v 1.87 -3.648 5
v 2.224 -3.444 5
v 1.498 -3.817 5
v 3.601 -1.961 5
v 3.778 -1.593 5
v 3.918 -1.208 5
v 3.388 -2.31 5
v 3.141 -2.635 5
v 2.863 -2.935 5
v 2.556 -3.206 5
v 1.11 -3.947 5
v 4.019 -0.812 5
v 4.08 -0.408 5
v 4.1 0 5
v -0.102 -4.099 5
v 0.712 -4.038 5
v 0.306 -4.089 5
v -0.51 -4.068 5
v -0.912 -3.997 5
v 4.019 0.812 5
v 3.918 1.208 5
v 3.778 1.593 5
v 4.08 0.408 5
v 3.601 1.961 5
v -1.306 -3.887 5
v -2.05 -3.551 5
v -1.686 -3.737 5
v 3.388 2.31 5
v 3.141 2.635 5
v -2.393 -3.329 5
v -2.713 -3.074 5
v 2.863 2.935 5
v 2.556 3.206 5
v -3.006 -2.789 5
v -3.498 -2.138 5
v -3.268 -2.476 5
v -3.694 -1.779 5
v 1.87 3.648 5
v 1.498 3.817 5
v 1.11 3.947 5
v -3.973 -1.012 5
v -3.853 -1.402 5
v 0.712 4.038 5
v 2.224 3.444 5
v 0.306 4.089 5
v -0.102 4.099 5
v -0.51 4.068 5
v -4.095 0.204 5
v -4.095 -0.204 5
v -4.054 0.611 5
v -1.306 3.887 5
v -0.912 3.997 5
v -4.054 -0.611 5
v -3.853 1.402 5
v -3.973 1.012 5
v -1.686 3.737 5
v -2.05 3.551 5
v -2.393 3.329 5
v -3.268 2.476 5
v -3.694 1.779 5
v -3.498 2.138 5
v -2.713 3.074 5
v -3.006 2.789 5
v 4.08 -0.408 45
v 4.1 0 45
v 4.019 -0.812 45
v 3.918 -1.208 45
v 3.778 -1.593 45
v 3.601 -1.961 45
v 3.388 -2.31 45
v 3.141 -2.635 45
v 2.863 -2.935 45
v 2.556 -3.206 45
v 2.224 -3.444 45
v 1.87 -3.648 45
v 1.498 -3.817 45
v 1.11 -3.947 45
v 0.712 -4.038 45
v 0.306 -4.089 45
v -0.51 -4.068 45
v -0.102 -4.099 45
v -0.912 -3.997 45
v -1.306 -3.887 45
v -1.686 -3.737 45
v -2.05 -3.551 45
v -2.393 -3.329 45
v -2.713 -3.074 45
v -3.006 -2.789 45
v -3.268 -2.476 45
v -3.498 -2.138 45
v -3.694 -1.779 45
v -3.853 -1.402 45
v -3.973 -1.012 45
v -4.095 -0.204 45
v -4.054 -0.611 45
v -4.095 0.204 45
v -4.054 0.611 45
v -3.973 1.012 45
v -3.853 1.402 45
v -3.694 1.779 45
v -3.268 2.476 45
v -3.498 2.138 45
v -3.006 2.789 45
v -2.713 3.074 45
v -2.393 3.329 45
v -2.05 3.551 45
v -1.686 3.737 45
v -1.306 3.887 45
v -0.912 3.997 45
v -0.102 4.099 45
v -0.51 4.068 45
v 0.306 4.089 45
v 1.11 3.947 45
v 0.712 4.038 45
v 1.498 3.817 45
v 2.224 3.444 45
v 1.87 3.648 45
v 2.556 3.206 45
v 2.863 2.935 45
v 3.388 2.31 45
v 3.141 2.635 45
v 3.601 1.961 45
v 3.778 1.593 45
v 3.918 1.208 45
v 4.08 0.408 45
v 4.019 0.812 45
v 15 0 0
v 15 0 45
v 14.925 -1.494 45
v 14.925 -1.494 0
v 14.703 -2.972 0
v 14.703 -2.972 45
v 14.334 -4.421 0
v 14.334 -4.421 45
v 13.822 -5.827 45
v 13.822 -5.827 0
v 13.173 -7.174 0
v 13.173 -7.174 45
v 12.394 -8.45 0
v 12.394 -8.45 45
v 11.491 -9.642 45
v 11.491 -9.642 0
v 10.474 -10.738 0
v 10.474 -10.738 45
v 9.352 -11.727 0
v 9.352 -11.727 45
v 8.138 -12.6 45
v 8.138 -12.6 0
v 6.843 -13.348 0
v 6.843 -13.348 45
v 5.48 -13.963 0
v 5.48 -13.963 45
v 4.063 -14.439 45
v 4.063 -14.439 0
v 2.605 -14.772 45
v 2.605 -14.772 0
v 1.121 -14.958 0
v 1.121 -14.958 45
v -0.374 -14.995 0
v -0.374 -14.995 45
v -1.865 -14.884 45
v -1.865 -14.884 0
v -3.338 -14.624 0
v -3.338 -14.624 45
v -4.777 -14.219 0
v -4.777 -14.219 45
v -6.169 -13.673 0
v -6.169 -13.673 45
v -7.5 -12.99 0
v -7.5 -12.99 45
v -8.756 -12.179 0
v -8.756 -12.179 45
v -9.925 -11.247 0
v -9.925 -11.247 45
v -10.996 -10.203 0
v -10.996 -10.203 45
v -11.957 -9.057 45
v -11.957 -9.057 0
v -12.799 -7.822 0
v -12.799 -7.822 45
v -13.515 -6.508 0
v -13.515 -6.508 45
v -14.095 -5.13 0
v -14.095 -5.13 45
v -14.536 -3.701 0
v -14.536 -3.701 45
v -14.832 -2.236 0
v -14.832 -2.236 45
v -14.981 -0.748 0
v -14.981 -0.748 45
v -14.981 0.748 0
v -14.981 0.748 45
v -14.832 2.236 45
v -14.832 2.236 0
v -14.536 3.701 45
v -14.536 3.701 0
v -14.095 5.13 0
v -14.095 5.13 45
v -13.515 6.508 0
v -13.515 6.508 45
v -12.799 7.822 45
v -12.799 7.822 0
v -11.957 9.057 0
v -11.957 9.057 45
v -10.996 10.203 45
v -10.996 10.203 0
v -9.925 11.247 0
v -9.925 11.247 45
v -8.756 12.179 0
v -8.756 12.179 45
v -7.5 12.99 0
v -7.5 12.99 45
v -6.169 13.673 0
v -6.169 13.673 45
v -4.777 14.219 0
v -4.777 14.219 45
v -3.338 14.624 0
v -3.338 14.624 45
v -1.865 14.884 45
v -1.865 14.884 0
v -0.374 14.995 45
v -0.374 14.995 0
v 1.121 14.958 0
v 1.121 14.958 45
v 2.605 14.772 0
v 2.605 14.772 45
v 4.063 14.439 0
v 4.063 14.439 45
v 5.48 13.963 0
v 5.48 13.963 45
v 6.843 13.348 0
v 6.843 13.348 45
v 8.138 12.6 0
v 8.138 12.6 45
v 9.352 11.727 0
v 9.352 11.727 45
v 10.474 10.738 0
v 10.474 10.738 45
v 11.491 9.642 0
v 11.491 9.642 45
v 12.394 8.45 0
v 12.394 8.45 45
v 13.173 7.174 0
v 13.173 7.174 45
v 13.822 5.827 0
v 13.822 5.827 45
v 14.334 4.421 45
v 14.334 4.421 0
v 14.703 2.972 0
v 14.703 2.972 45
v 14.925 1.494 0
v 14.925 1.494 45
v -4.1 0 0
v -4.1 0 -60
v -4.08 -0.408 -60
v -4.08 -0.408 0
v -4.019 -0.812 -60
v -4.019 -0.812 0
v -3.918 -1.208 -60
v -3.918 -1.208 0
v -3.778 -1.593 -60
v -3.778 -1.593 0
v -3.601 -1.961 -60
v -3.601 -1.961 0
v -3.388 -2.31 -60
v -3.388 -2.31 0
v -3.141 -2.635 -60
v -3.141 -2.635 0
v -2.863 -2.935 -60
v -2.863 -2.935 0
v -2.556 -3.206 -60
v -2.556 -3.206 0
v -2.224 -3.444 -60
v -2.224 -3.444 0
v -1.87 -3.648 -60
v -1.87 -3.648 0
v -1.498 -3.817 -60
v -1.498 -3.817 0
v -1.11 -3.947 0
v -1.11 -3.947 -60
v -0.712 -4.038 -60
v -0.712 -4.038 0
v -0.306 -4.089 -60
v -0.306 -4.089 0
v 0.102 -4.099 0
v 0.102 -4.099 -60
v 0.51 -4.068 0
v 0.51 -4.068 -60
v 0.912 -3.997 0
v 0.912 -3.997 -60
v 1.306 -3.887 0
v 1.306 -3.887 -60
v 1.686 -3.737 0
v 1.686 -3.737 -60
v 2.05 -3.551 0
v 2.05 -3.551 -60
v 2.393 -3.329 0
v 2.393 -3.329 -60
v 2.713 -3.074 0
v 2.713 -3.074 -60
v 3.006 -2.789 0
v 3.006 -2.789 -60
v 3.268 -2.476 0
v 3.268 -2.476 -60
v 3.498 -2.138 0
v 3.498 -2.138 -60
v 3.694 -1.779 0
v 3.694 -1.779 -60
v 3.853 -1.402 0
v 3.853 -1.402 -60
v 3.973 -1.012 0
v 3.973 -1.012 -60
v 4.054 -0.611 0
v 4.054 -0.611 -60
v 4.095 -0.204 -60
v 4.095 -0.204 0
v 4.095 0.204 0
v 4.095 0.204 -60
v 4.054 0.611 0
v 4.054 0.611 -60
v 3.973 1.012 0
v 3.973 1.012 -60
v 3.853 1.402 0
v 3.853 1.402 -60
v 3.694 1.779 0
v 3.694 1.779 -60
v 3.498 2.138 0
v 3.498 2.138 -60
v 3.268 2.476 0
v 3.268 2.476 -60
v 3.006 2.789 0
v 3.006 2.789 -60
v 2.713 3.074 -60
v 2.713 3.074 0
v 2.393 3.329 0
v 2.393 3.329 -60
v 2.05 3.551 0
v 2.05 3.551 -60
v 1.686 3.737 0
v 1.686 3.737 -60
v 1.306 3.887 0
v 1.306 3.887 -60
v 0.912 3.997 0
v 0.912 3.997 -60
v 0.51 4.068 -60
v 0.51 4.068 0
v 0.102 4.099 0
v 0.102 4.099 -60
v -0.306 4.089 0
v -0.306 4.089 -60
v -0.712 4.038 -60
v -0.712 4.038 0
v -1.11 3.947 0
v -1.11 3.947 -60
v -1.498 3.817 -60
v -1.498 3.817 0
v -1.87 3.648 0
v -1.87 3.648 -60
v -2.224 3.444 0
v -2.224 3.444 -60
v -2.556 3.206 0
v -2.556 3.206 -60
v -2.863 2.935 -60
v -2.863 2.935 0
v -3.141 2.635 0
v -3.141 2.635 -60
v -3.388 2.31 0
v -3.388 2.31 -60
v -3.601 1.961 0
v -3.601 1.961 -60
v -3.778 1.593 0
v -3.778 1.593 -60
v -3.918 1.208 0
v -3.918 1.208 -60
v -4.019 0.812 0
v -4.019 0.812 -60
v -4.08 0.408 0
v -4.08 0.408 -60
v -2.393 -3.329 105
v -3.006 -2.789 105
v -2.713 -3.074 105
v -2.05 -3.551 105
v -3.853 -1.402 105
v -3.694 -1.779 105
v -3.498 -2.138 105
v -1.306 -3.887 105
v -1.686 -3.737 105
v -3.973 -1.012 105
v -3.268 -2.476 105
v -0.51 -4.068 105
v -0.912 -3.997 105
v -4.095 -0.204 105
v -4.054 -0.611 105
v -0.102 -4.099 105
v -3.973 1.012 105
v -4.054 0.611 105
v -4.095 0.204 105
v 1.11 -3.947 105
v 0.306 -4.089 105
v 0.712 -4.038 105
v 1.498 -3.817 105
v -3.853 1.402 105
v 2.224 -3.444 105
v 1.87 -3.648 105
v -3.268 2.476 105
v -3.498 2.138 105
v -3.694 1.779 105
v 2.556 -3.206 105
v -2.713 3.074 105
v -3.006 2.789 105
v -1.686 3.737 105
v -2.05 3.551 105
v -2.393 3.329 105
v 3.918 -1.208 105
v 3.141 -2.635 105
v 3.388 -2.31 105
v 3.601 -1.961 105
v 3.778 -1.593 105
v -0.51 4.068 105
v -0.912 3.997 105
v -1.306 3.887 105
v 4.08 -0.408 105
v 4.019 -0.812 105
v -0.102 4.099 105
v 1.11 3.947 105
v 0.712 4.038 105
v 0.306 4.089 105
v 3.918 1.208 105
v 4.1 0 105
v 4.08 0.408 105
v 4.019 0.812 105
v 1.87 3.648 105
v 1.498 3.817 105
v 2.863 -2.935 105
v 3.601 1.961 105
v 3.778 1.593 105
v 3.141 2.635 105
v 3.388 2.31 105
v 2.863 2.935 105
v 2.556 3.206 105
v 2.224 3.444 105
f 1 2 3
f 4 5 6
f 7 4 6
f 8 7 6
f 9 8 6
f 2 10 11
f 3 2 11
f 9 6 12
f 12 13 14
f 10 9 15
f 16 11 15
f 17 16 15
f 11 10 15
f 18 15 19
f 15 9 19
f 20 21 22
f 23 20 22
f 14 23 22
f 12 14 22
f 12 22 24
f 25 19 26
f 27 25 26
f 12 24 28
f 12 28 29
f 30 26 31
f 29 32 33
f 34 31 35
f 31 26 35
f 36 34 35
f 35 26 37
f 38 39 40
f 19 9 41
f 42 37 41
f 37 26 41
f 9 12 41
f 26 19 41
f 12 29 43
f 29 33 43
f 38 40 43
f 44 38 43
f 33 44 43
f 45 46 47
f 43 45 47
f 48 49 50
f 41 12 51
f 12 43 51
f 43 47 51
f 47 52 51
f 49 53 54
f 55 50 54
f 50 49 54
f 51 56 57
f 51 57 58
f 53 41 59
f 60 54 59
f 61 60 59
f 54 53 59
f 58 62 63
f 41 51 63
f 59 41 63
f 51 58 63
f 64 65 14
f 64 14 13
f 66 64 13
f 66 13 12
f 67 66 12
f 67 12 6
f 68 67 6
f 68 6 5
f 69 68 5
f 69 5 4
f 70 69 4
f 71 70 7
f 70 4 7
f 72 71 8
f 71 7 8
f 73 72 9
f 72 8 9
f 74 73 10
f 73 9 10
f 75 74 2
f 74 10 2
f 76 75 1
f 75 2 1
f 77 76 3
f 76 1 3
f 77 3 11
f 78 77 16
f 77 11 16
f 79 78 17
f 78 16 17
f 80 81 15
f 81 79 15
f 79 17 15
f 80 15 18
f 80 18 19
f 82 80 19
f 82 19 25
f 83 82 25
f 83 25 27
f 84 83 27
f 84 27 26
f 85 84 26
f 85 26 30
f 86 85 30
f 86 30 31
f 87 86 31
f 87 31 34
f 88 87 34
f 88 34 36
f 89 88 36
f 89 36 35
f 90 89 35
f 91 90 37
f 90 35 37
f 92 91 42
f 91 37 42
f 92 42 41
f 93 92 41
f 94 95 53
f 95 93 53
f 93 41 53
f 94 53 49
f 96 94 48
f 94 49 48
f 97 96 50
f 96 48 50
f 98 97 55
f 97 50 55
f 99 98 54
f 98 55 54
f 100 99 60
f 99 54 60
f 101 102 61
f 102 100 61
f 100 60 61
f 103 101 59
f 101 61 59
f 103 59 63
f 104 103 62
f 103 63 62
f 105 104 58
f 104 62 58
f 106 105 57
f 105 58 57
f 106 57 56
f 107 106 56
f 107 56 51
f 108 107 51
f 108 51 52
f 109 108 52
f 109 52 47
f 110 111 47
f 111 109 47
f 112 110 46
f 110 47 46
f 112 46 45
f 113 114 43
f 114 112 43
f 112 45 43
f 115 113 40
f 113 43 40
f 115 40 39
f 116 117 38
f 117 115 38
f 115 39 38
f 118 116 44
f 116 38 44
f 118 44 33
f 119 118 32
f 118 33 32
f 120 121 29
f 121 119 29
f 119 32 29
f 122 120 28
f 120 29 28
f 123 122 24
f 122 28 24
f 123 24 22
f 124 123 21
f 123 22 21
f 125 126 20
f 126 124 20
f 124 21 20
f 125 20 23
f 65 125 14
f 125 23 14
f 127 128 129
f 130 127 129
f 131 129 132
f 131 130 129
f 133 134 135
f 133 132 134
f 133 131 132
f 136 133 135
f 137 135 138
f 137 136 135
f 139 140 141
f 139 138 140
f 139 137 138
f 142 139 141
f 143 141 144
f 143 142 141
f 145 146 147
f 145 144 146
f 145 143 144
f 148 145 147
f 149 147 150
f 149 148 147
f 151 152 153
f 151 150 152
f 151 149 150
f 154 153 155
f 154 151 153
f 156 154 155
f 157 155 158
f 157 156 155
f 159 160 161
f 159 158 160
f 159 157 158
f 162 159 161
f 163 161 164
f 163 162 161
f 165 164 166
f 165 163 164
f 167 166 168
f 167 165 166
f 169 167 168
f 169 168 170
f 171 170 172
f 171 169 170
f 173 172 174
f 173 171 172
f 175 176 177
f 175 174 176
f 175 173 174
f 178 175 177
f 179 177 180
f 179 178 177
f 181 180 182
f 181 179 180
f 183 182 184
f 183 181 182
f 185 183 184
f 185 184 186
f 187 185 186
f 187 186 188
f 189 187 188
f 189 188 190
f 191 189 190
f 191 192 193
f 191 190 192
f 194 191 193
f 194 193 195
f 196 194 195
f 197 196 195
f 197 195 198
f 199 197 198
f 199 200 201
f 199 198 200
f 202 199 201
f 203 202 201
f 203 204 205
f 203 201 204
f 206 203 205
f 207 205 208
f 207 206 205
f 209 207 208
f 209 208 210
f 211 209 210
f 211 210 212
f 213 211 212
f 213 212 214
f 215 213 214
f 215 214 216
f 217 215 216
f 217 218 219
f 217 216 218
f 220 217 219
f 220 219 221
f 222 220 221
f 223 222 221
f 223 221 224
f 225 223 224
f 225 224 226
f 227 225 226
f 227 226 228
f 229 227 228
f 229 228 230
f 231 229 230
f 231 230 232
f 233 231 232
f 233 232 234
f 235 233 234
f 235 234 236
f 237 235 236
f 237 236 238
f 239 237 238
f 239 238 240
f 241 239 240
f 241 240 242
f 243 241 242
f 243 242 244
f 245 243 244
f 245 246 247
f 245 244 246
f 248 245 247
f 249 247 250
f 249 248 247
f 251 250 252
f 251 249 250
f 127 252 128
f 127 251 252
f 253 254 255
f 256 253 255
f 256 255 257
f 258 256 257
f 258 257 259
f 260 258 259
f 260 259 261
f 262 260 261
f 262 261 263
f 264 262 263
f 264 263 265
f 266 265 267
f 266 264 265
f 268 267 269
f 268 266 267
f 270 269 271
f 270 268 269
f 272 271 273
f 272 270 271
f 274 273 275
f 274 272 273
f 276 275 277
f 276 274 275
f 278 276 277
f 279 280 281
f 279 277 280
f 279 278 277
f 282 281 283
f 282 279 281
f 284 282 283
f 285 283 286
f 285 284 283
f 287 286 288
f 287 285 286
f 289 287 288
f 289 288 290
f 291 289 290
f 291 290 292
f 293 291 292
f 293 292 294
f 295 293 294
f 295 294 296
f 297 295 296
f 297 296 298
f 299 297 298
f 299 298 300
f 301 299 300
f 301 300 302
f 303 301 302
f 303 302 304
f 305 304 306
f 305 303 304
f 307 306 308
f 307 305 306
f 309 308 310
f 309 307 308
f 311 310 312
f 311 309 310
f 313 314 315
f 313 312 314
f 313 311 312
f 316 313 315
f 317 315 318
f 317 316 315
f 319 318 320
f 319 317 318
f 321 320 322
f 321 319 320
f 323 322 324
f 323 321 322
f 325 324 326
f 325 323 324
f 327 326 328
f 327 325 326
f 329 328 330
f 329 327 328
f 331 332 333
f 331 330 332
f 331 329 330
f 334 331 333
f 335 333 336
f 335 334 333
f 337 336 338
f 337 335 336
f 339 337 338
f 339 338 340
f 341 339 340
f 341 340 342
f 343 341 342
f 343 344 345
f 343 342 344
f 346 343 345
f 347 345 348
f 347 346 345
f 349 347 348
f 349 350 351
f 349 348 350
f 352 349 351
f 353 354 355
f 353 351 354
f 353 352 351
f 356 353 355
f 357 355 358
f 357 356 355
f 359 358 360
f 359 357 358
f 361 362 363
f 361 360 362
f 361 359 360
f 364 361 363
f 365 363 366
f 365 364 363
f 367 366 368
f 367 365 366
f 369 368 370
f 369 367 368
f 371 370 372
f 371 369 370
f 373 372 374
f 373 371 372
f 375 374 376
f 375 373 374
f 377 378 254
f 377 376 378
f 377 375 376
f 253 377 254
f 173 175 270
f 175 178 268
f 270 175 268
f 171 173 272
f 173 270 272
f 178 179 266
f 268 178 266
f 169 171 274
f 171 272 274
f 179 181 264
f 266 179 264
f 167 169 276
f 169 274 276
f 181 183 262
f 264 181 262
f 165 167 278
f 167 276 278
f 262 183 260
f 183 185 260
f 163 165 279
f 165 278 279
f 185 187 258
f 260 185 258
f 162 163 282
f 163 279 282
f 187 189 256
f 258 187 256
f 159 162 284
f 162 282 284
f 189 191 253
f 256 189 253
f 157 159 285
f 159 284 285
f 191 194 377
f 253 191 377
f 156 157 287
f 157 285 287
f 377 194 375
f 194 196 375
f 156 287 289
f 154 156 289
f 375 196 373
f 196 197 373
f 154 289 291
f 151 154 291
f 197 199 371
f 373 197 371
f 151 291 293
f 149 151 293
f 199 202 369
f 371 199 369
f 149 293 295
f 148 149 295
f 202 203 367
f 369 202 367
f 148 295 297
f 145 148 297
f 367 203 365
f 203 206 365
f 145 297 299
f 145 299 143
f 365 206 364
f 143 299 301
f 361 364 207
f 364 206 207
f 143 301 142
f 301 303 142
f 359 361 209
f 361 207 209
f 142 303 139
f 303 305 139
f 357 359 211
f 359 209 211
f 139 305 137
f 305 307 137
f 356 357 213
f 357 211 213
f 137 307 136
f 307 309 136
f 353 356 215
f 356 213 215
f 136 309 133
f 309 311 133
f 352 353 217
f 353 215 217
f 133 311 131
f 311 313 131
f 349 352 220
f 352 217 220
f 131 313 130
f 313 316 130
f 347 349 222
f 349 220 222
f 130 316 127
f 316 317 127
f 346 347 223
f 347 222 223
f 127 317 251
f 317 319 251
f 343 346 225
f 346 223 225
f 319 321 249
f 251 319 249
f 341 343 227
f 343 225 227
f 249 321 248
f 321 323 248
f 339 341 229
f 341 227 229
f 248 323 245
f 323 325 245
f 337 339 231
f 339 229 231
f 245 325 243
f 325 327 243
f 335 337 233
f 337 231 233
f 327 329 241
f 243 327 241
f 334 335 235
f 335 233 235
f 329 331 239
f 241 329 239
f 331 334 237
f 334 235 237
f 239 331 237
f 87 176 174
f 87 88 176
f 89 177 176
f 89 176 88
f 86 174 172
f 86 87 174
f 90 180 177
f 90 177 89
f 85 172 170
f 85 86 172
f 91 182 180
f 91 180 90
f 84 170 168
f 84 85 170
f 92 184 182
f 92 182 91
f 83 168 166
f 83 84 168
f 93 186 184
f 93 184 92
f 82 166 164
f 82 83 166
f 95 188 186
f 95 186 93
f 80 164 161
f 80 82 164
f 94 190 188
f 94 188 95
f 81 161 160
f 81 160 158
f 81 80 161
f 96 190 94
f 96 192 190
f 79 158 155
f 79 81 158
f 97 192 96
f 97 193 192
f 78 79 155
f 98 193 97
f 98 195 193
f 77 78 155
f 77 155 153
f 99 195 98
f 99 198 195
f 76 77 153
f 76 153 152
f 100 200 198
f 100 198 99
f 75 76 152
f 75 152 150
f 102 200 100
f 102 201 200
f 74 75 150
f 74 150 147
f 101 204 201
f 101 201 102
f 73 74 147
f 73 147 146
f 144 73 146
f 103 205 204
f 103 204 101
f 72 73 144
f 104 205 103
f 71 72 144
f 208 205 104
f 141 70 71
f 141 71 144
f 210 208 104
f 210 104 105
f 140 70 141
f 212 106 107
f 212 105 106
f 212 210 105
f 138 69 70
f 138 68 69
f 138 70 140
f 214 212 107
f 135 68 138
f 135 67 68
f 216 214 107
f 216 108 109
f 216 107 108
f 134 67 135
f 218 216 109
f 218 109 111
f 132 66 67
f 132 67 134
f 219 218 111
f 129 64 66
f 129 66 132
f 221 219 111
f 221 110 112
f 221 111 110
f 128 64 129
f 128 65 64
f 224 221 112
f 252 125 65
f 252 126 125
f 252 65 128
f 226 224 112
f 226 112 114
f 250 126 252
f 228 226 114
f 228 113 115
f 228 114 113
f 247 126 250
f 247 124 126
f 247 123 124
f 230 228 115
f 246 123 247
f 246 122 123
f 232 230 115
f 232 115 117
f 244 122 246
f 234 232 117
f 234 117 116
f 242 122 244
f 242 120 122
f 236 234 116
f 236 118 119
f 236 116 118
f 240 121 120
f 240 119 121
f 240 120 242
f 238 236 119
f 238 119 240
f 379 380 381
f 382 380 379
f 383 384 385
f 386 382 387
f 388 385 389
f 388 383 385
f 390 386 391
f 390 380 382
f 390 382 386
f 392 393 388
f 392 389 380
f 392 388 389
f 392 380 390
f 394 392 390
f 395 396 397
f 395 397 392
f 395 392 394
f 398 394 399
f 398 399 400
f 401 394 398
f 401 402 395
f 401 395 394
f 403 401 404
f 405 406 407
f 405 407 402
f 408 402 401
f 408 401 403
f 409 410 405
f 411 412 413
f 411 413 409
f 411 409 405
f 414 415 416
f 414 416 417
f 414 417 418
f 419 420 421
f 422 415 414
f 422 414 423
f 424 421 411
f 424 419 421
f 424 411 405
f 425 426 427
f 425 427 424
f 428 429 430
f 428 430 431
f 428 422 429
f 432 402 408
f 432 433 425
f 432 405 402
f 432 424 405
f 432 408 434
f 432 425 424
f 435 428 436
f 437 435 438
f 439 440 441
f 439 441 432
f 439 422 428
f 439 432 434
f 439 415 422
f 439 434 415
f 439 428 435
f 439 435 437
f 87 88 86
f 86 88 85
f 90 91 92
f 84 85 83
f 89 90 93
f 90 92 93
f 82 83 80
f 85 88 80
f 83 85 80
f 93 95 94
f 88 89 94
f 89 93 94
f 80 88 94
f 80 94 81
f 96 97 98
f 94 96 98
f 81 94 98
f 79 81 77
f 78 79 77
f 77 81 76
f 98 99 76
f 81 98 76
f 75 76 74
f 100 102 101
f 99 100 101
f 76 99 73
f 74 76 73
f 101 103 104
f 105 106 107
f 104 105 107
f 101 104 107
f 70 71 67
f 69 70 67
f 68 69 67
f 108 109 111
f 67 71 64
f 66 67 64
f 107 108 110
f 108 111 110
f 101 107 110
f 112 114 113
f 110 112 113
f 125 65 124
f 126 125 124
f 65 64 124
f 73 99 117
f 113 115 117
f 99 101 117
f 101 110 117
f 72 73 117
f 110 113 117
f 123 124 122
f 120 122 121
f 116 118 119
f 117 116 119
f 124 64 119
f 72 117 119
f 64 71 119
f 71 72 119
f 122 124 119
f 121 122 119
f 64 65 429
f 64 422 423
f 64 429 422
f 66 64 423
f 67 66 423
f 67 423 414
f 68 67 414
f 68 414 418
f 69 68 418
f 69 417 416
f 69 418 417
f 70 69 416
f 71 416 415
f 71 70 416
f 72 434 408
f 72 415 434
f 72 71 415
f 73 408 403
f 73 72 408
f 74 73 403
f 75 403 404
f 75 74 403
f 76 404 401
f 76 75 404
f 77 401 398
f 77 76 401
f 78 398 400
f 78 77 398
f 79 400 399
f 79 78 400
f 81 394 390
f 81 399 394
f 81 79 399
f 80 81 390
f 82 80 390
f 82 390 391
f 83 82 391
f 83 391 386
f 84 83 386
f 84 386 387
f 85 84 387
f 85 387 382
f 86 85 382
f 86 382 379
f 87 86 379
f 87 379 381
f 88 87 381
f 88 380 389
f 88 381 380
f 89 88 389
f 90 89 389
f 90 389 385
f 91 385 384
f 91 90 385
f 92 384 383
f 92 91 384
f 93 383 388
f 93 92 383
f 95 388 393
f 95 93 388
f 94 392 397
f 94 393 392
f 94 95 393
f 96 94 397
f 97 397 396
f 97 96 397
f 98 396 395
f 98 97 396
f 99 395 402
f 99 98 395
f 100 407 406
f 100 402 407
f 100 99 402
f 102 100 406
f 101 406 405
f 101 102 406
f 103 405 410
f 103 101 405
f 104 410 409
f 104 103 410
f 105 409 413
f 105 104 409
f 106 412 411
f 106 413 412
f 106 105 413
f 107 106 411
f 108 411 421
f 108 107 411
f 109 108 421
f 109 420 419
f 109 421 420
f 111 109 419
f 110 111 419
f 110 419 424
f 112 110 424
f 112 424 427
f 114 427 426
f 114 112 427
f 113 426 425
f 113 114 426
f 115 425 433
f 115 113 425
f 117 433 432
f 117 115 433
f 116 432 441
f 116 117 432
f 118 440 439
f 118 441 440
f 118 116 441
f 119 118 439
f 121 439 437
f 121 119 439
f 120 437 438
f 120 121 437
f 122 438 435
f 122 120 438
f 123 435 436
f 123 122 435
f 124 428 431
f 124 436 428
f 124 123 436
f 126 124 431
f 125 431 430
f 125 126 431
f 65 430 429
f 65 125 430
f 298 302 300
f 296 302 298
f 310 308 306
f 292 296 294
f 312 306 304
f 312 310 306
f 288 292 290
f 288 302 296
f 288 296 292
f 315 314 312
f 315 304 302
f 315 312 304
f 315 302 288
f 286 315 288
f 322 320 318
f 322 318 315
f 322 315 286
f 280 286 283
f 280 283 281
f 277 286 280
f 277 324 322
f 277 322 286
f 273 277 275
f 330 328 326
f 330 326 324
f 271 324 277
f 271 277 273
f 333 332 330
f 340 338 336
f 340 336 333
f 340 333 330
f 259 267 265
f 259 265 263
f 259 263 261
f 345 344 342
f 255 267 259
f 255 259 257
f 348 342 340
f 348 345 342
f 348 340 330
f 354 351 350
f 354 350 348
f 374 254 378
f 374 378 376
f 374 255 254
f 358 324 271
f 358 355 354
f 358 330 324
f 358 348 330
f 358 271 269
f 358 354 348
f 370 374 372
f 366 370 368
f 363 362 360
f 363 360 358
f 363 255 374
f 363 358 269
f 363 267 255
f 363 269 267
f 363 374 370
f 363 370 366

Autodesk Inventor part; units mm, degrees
ref_plane "YZ Plane" through (0, 0, 0) normal (1, 0, 0) x (0, 1, 0)
ref_plane "XZ Plane" through (0, 0, 0) normal (0, 1, 0) x (-1, 0, 0)
ref_plane "XY Plane" through (0, 0, 0) normal (0, 0, 1) x (1, 0, 0)
sketch "Sketch1" plane through (0, 0, 0) normal (0, 0, 1) x (1, 0, 0)
  circle A0 centre (0, 0) radius 15
  circle A1 centre (0, 0) radius 4.1
  dimension "d0" = 30
  dimension "d2" = 8.2
extrude "Extrusion1" add sketch "Sketch1" along normal blind 45
sketch "Sketch2" plane through (0, 0, 0) normal (0, 0, 1) x (1, 0, 0)
  point P0 (0, 0)
sketch "Sketch3" plane through (0, 0, 0) normal (0, 0, 1) x (1, 0, 0)
  point P0 (0, 0)
sketch "Sketch4" plane through (0, 0, 45) normal (0, 0, 1) x (1, 0, 0)
  circle A0 centre (0, 0) radius 4.1 projected
  circle A1 centre (0, 0) radius 4.1
sketch "Sketch5" plane through (0, 0, 0) normal (0, 0, -1) x (-1, 0, 0)
  circle A0 centre (0, 0) radius 4.1
extrude "Extrusion2" add sketch "Sketch5" along normal blind 60 and the other way blind 5
extrude "Extrusion3" add sketch "Sketch4" along normal blind 60
properties part number "Roller_3DPrint"
